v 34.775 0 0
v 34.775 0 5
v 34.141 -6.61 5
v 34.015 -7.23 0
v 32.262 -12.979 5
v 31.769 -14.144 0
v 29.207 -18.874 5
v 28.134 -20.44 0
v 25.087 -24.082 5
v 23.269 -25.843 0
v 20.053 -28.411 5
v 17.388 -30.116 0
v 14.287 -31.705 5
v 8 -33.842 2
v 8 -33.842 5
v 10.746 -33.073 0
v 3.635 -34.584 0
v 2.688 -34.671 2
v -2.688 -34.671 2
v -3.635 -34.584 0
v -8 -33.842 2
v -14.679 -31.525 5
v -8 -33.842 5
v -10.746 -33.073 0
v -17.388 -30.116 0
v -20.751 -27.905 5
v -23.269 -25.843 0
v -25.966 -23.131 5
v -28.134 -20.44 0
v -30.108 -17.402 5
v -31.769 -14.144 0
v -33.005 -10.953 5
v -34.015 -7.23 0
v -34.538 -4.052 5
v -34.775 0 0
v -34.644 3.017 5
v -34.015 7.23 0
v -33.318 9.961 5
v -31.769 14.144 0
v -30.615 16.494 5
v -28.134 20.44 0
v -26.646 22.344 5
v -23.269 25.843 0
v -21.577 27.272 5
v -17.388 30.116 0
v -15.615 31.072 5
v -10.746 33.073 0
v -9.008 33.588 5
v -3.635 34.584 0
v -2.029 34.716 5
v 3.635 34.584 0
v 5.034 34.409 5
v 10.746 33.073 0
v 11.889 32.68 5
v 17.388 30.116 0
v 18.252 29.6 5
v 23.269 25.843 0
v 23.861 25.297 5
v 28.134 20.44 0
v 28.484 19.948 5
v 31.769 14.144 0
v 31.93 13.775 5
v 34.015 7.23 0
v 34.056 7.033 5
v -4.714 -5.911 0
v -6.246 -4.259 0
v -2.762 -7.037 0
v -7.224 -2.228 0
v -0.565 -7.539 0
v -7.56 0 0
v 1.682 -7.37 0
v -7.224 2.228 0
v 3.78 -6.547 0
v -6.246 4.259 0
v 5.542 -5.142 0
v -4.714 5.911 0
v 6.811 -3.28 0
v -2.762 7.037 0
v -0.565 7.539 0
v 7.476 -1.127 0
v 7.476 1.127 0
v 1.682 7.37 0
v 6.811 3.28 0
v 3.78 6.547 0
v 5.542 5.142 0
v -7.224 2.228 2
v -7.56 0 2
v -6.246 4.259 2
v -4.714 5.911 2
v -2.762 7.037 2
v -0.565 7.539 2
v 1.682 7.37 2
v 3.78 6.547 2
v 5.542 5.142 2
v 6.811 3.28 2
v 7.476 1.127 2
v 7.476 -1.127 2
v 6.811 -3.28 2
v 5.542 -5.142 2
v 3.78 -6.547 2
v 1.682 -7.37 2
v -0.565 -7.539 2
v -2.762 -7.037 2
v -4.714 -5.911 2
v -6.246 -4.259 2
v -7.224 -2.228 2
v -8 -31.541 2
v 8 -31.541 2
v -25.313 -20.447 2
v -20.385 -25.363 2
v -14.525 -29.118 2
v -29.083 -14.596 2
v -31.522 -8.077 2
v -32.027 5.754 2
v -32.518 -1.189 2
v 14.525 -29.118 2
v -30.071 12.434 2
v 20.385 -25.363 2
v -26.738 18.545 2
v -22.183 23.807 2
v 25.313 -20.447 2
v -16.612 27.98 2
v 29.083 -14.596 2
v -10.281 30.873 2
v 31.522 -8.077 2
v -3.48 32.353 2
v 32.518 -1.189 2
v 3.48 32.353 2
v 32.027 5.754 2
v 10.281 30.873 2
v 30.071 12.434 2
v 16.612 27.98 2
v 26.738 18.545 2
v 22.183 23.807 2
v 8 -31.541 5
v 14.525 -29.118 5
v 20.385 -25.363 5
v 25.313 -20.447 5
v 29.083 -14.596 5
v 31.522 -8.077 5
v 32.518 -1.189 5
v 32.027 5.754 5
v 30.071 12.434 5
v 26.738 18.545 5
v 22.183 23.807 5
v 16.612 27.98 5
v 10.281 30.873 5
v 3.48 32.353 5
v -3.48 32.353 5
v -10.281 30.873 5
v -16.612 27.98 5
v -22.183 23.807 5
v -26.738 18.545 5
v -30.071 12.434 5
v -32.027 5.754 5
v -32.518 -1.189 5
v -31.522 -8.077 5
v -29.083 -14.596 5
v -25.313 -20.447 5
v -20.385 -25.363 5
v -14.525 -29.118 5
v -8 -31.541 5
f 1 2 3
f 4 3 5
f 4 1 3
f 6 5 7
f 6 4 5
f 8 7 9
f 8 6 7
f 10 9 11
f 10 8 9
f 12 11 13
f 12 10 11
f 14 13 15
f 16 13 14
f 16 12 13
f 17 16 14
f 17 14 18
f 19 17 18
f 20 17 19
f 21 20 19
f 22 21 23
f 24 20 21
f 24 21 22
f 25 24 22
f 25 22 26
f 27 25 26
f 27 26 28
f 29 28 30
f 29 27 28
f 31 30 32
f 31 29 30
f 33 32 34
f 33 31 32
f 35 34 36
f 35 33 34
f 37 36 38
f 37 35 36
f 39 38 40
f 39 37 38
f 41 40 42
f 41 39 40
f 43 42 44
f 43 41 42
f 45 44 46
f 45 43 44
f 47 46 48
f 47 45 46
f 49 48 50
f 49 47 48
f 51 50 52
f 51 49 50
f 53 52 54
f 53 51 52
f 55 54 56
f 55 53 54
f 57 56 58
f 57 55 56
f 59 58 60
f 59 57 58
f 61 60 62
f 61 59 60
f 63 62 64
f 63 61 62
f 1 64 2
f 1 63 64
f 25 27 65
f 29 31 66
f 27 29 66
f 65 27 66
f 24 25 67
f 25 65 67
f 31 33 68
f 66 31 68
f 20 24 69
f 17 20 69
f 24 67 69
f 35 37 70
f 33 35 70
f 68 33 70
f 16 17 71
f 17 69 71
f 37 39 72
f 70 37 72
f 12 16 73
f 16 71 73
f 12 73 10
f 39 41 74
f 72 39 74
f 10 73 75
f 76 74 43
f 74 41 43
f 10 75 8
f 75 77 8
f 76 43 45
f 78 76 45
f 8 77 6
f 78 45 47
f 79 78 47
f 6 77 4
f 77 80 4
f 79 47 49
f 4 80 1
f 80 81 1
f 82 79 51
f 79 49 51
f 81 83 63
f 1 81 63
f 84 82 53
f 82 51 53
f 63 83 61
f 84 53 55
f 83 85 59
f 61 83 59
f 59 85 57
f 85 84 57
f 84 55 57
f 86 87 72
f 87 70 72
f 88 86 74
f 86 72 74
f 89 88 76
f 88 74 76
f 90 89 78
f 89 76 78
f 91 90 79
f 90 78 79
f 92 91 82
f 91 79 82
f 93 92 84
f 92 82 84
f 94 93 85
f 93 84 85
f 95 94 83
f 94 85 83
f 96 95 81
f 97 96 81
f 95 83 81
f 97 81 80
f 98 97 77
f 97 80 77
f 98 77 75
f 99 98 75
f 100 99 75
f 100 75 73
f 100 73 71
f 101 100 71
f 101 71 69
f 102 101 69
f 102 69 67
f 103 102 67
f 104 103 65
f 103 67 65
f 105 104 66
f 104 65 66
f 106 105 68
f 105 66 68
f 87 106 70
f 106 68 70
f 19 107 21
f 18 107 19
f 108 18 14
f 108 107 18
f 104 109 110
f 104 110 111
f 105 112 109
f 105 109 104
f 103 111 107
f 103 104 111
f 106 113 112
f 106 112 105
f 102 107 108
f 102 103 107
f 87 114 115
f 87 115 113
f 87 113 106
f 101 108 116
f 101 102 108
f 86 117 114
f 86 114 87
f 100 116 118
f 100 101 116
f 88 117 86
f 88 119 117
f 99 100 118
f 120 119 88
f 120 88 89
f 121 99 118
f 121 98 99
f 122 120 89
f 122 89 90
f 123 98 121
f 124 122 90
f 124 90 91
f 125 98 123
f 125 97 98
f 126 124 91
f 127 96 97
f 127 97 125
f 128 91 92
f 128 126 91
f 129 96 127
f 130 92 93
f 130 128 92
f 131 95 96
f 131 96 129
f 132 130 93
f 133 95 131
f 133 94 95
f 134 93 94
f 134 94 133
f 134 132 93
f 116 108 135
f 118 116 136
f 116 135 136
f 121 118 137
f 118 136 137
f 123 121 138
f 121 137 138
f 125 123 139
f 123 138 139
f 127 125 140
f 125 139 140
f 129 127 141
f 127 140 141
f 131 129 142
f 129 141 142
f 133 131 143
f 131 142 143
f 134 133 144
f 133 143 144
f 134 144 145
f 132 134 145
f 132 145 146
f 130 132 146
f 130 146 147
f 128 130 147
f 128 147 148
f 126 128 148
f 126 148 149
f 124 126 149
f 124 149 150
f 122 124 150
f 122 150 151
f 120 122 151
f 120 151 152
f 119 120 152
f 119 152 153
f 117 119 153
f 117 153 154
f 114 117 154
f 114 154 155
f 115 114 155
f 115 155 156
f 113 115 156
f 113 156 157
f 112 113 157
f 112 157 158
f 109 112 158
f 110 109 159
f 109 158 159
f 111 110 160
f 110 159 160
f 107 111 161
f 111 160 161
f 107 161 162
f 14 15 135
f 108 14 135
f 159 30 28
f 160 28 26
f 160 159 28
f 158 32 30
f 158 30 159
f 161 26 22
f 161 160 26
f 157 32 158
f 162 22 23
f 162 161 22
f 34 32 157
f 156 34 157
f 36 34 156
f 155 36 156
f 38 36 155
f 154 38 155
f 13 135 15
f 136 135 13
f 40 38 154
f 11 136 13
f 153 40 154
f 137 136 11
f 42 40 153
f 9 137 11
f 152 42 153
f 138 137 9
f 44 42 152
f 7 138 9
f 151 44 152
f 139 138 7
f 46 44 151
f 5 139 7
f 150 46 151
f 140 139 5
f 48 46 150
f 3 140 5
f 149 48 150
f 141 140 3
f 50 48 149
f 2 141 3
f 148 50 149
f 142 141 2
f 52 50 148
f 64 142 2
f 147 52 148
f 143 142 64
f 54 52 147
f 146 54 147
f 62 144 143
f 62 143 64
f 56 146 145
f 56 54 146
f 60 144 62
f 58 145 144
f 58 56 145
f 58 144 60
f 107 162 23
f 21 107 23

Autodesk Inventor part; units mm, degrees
ref_plane "YZ Plane" through (0, 0, 0) normal (1, 0, 0) x (0, 1, 0)
ref_plane "XZ Plane" through (0, 0, 0) normal (0, 1, 0) x (-1, 0, 0)
ref_plane "XY Plane" through (0, 0, 0) normal (0, 0, 1) x (1, 0, 0)
sketch "Skizze1" plane through (0, 0, 0) normal (0, 0, 1) x (1, 0, 0)
  circle A0 centre (0, 0) radius 34.775
  dimension "d0" = 69.55
extrude "Extrusion1" add sketch "Skizze1" along normal blind 5
sketch "Skizze2" plane through (0, 0, 5) normal (0, 0, 1) x (1, 0, 0)
  circle A0 centre (0, 0) radius 32.54
  dimension "d3" = 65.08
extrude "Extrusion2" cut sketch "Skizze2" against normal blind 3
sketch "Skizze3" plane through (0, 0, 0) normal (0, 0, -1) x (-1, 0, 0)
  circle A0 centre (0, 0) radius 7.56
  dimension "d6" = 15.12
extrude "Extrusion3" cut sketch "Skizze3" against normal through all
sketch "Skizze4" plane through (0, 0, 5) normal (0, 0, 1) x (1, 0, 0)
  line L0 (-8, -42.775) -> (8, -42.775)
  line L1 (8, -42.775) -> (8, -26.775)
  line L2 (8, -26.775) -> (-8, -26.775)
  line L3 (-8, -26.775) -> (-8, -42.775)
  circle A0 centre (0, 0) radius 34.775 projected
  line L4 (-8, -42.775) -> (8, -26.775) construction
  line L5 (8, -42.775) -> (-8, -26.775) construction
  point P0 (0, -34.775)
  dimension "d9" = 16
  dimension "d10" = 16
extrude "Extrusion4" cut sketch "Skizze4" against normal up to surface (3 mm away) contours L3 A0 L1 L0 | L3 L2 L1 A0 picked at (0.896, -29.407)
properties part number "2024_08_28_Holder_disk_GCvial"
